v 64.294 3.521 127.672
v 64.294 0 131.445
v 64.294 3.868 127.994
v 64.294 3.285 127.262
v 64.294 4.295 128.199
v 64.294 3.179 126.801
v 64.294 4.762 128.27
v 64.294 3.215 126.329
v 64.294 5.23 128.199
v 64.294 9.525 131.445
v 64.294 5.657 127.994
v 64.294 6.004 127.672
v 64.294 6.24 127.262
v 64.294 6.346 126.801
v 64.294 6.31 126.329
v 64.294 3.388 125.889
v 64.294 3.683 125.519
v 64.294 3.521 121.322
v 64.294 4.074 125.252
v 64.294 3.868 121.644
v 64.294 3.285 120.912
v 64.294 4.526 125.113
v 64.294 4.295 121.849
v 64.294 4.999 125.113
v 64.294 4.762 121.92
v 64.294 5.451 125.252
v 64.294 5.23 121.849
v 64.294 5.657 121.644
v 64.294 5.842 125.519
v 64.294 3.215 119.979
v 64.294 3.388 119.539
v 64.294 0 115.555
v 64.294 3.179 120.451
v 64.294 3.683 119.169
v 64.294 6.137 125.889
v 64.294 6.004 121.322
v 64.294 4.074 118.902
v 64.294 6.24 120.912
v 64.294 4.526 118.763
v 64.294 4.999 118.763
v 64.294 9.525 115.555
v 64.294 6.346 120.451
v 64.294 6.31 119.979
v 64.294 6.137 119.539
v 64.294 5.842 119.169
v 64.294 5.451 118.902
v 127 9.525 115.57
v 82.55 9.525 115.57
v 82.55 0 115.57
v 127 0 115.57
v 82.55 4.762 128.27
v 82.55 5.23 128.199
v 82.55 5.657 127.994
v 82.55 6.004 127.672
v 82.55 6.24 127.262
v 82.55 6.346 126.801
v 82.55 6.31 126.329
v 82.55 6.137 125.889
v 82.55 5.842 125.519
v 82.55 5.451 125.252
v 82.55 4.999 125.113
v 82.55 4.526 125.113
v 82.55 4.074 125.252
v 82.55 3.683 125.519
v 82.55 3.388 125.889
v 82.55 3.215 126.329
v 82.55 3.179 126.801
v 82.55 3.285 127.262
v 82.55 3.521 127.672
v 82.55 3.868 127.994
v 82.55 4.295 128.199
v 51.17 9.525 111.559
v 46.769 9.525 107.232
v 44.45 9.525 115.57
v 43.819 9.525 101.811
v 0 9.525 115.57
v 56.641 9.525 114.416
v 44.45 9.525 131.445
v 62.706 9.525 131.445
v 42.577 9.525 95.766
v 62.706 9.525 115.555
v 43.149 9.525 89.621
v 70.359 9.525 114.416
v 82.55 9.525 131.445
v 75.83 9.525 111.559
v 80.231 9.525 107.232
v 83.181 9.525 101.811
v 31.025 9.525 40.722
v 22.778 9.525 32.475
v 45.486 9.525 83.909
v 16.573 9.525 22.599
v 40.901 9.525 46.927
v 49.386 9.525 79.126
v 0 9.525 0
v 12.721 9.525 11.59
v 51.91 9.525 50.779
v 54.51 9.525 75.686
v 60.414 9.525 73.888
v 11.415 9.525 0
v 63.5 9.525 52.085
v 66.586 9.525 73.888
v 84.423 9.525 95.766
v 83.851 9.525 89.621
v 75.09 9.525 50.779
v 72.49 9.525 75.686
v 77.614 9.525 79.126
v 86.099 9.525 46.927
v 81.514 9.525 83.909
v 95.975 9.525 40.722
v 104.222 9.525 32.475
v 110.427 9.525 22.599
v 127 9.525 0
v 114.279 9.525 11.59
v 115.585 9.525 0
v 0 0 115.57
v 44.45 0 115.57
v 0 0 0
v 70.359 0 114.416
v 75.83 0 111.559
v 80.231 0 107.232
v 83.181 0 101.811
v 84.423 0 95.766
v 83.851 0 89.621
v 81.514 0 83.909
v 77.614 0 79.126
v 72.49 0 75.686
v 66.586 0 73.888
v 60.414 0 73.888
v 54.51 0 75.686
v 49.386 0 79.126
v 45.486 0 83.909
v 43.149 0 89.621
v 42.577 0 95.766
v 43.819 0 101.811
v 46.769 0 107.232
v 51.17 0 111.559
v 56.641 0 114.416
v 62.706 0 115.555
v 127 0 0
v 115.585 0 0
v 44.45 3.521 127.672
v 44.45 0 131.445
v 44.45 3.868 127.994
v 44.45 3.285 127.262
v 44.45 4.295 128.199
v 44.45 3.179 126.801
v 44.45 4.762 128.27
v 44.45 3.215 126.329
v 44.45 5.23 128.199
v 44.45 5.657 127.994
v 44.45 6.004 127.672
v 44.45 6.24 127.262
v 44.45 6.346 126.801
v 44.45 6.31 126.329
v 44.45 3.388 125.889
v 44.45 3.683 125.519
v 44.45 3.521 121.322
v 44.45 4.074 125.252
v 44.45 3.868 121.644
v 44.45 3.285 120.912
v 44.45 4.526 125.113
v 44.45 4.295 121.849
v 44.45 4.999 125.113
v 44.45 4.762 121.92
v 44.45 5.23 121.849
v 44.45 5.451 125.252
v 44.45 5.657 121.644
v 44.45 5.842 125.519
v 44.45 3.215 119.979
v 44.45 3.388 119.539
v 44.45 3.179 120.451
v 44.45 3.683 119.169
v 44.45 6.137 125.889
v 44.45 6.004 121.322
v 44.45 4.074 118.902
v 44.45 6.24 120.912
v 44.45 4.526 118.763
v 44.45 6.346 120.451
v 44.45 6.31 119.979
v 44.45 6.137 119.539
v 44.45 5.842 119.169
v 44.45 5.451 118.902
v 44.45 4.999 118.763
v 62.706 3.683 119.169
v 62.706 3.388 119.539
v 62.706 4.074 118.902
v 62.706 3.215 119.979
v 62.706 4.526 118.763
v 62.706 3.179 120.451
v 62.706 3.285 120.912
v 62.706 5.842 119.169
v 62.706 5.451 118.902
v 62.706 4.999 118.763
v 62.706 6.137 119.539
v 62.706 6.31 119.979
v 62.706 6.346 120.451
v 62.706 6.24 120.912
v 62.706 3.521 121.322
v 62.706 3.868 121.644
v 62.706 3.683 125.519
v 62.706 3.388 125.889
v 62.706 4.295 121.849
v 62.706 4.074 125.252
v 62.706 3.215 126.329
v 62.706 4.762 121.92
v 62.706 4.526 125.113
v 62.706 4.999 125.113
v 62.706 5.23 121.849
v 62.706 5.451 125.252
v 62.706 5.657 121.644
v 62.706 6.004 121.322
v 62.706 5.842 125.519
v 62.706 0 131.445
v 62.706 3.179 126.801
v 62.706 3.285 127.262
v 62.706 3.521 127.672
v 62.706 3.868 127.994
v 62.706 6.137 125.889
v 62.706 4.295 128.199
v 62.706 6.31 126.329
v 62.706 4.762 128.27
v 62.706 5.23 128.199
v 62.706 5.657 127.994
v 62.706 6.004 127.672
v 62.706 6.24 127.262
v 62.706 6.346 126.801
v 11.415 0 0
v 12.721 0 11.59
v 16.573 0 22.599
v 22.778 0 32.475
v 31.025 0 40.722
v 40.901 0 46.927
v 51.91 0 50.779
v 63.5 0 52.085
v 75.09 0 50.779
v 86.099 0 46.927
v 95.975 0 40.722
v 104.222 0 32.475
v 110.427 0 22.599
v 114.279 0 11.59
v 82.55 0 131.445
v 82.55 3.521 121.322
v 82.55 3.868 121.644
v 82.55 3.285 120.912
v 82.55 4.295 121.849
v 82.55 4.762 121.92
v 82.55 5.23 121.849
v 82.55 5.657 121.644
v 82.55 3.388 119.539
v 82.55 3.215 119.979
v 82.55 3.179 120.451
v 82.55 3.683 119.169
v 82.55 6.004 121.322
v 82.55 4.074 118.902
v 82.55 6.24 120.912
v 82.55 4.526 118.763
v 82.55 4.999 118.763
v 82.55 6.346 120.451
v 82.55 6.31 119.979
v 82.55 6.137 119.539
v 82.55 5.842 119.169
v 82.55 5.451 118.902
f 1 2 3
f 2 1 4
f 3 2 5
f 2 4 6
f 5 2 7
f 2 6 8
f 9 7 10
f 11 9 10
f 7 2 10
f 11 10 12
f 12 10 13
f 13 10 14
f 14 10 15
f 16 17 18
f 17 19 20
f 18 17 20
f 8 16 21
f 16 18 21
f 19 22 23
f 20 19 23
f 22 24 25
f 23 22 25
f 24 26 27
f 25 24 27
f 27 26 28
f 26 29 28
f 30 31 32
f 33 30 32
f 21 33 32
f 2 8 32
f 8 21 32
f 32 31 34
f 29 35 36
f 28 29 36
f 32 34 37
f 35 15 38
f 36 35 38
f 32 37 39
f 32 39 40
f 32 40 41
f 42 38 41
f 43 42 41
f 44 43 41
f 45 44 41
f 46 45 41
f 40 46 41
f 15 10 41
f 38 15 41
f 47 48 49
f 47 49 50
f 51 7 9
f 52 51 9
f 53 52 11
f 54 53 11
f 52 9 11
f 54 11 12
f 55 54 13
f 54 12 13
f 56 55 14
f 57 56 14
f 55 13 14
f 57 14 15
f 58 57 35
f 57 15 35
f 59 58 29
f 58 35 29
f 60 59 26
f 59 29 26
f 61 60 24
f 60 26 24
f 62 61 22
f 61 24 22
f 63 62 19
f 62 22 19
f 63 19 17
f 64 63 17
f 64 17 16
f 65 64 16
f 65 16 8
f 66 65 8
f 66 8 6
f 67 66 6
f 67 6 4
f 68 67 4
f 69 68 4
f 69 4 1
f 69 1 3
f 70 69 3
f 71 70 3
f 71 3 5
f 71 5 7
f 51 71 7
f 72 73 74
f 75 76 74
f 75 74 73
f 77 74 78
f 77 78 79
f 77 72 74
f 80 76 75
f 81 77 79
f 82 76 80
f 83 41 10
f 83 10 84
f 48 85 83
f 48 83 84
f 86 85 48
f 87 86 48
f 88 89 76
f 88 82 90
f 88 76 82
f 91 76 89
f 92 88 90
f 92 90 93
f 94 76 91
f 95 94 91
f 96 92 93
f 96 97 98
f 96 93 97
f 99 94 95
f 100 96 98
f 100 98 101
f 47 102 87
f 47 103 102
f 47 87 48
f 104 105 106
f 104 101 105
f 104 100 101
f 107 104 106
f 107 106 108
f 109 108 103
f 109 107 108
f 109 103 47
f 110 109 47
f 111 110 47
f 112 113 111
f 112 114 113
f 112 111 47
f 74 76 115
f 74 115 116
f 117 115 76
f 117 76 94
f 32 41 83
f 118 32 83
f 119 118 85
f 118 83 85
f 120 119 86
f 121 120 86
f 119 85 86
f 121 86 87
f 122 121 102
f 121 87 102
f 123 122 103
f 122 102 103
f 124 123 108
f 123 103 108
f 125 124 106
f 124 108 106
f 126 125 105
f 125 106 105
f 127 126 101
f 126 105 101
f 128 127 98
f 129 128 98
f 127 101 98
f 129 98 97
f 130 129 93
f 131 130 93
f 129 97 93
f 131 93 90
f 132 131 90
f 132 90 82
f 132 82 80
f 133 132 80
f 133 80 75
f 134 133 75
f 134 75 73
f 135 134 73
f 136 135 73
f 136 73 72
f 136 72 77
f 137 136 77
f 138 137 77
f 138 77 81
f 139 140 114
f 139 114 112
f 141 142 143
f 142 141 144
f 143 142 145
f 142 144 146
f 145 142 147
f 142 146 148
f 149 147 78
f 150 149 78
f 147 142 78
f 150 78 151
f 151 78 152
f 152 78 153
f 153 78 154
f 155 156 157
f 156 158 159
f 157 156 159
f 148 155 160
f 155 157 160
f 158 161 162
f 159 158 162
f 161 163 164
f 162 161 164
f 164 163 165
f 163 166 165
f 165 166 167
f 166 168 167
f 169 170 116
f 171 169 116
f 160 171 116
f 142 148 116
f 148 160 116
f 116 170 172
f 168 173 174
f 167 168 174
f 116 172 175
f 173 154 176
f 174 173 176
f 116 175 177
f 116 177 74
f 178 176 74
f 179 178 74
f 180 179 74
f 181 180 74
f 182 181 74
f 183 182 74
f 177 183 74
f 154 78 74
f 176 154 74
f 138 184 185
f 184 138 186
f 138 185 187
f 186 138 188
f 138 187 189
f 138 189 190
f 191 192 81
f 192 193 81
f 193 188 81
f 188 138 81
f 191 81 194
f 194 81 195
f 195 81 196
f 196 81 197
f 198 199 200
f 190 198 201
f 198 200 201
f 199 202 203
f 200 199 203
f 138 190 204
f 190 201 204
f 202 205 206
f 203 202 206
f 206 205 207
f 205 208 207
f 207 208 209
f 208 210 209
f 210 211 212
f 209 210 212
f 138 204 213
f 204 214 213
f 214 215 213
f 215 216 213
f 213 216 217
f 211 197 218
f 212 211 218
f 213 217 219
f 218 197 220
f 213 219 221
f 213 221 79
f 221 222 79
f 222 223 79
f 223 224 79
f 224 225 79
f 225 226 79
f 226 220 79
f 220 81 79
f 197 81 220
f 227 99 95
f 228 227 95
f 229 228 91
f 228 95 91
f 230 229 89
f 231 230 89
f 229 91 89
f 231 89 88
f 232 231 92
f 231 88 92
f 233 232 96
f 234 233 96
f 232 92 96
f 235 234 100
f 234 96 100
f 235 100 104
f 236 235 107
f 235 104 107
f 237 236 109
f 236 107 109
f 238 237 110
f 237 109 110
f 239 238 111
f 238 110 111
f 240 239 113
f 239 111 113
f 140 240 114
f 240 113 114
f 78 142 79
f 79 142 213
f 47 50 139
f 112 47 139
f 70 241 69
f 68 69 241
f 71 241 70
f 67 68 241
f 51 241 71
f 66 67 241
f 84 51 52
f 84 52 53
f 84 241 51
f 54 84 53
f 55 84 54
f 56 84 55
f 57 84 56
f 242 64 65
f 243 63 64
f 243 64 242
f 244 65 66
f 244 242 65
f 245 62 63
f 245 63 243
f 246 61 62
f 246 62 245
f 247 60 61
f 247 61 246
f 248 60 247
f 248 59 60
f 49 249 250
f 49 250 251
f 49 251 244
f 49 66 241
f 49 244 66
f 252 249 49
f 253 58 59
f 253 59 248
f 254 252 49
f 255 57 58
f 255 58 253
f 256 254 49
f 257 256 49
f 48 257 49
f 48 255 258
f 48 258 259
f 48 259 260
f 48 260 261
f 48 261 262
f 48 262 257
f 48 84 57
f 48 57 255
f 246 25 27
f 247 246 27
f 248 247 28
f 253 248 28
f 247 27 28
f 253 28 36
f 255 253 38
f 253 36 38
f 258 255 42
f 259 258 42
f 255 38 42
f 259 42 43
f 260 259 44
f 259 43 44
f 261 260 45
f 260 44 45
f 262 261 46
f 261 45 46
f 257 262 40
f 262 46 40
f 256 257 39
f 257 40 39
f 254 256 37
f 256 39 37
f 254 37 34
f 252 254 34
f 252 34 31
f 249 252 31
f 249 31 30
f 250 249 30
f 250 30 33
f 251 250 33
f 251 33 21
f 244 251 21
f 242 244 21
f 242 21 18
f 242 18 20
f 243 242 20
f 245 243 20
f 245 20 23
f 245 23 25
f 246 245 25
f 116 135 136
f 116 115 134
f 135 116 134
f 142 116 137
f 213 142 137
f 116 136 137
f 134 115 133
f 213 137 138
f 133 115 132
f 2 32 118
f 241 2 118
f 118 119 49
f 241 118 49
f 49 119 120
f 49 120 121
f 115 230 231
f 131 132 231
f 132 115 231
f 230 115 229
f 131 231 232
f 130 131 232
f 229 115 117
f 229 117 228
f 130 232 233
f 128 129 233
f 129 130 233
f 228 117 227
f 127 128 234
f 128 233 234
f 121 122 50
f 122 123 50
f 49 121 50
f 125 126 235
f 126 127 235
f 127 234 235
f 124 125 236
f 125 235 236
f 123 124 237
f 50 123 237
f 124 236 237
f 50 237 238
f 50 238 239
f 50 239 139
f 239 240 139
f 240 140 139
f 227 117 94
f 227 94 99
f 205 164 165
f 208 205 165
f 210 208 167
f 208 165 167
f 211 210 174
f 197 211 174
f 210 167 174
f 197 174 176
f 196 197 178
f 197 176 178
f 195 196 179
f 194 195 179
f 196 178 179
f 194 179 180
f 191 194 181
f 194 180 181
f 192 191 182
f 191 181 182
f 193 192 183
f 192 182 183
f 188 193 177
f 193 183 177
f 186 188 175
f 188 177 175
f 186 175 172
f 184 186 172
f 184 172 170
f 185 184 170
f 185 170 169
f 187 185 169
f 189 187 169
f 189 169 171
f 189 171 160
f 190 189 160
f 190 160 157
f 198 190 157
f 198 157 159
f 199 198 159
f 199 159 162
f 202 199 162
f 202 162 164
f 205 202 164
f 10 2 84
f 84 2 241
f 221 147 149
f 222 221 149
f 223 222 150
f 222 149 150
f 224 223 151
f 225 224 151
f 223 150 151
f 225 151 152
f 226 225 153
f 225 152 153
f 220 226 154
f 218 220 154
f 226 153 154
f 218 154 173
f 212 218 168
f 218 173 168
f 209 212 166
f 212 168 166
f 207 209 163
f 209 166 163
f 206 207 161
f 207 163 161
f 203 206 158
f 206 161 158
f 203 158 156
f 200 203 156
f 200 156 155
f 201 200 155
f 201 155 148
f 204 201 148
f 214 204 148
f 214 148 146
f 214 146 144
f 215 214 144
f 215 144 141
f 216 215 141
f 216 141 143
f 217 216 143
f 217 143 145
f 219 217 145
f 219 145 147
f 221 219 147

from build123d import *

# Parameters (mm, degrees)
SKETCH1_W           = 127
SKETCH1_H           = 131.445
BOSS_EXTRUDE1_DEPTH = 9.525
SKETCH2_W           = 44.45
SKETCH2_H           = 15.875
CUT_EXTRUDE1_DEPTH  = 10.525
CUT_EXTRUDE2_DEPTH  = 10.525
CUT_EXTRUDE3_DEPTH  = 10.525
SKETCH6_R           = 1.5875
CUT_EXTRUDE4_DEPTH  = 83.55


with BuildPart() as part:
    # Sketch1 → Boss-Extrude1 (new body)
    with BuildSketch(Plane(origin=(0, 0, 0), x_dir=(1, 0, 0), z_dir=(0, 1, 0))):
        with Locations((63.5, -65.7225)):
            Rectangle(SKETCH1_W, SKETCH1_H)
    extrude(amount=BOSS_EXTRUDE1_DEPTH)

    # Sketch2 → Cut-Extrude1 (cut, through all)
    with BuildSketch(Plane(origin=(0, 9.525, 0), x_dir=(1, 0, 0), z_dir=(0, 1, 0))):
        with Locations((22.225, -123.5075)):
            Rectangle(SKETCH2_W, SKETCH2_H)
        with Locations((104.775, -123.5075)):
            Rectangle(SKETCH2_W, SKETCH2_H)
    extrude(amount=-CUT_EXTRUDE1_DEPTH, mode=Mode.SUBTRACT)

    # Sketch3 → Cut-Extrude2 (cut, through all)
    with BuildSketch(Plane(origin=(0, 9.525, 0), x_dir=(1, 0, 0), z_dir=(0, 1, 0))):
        with BuildLine():
            Line((63.5, -131.445), (64.29375, -131.445))
            Line((64.29375, -131.445), (64.29375, -115.57))
            Line((64.29375, -115.57), (64.29375, -115.55496146))
            ThreePointArc((64.29375, -115.55496146), (63.5, -73.66), (62.70625, -115.55496146))
            Line((62.70625, -115.55496146), (62.70625, -115.57))
            Line((62.70625, -115.57), (62.70625, -131.445))
            Line((62.70625, -131.445), (63.5, -131.445))
        make_face()
    extrude(amount=-CUT_EXTRUDE2_DEPTH, mode=Mode.SUBTRACT)

    # Sketch5 → Cut-Extrude3 (cut, through all)
    with BuildSketch(Plane(origin=(0, 9.525, 0), x_dir=(1, 0, 0), z_dir=(0, 1, 0))):
        with BuildLine():
            ThreePointArc((11.41476, 0), (63.5, -52.08524), (115.58524, 0))
            Line((115.58524, 0), (11.41476, 0))
        make_face()
        with BuildLine():
            Line((11.41476, 0), (115.58524, 0))
            ThreePointArc((115.58524, 0), (63.5, 52.08524), (11.41476, 0))
        make_face()
    extrude(amount=-CUT_EXTRUDE3_DEPTH, mode=Mode.SUBTRACT)

    # Sketch6 → Cut-Extrude4 (cut, through all)
    with BuildSketch(Plane.ZY.offset(-44.45)):
        with Locations((120.3325, 4.7625)):
            Circle(SKETCH6_R)
        with Locations((126.6825, 4.7625)):
            Circle(SKETCH6_R)
    extrude(amount=-CUT_EXTRUDE4_DEPTH, mode=Mode.SUBTRACT)


solid = part.part
